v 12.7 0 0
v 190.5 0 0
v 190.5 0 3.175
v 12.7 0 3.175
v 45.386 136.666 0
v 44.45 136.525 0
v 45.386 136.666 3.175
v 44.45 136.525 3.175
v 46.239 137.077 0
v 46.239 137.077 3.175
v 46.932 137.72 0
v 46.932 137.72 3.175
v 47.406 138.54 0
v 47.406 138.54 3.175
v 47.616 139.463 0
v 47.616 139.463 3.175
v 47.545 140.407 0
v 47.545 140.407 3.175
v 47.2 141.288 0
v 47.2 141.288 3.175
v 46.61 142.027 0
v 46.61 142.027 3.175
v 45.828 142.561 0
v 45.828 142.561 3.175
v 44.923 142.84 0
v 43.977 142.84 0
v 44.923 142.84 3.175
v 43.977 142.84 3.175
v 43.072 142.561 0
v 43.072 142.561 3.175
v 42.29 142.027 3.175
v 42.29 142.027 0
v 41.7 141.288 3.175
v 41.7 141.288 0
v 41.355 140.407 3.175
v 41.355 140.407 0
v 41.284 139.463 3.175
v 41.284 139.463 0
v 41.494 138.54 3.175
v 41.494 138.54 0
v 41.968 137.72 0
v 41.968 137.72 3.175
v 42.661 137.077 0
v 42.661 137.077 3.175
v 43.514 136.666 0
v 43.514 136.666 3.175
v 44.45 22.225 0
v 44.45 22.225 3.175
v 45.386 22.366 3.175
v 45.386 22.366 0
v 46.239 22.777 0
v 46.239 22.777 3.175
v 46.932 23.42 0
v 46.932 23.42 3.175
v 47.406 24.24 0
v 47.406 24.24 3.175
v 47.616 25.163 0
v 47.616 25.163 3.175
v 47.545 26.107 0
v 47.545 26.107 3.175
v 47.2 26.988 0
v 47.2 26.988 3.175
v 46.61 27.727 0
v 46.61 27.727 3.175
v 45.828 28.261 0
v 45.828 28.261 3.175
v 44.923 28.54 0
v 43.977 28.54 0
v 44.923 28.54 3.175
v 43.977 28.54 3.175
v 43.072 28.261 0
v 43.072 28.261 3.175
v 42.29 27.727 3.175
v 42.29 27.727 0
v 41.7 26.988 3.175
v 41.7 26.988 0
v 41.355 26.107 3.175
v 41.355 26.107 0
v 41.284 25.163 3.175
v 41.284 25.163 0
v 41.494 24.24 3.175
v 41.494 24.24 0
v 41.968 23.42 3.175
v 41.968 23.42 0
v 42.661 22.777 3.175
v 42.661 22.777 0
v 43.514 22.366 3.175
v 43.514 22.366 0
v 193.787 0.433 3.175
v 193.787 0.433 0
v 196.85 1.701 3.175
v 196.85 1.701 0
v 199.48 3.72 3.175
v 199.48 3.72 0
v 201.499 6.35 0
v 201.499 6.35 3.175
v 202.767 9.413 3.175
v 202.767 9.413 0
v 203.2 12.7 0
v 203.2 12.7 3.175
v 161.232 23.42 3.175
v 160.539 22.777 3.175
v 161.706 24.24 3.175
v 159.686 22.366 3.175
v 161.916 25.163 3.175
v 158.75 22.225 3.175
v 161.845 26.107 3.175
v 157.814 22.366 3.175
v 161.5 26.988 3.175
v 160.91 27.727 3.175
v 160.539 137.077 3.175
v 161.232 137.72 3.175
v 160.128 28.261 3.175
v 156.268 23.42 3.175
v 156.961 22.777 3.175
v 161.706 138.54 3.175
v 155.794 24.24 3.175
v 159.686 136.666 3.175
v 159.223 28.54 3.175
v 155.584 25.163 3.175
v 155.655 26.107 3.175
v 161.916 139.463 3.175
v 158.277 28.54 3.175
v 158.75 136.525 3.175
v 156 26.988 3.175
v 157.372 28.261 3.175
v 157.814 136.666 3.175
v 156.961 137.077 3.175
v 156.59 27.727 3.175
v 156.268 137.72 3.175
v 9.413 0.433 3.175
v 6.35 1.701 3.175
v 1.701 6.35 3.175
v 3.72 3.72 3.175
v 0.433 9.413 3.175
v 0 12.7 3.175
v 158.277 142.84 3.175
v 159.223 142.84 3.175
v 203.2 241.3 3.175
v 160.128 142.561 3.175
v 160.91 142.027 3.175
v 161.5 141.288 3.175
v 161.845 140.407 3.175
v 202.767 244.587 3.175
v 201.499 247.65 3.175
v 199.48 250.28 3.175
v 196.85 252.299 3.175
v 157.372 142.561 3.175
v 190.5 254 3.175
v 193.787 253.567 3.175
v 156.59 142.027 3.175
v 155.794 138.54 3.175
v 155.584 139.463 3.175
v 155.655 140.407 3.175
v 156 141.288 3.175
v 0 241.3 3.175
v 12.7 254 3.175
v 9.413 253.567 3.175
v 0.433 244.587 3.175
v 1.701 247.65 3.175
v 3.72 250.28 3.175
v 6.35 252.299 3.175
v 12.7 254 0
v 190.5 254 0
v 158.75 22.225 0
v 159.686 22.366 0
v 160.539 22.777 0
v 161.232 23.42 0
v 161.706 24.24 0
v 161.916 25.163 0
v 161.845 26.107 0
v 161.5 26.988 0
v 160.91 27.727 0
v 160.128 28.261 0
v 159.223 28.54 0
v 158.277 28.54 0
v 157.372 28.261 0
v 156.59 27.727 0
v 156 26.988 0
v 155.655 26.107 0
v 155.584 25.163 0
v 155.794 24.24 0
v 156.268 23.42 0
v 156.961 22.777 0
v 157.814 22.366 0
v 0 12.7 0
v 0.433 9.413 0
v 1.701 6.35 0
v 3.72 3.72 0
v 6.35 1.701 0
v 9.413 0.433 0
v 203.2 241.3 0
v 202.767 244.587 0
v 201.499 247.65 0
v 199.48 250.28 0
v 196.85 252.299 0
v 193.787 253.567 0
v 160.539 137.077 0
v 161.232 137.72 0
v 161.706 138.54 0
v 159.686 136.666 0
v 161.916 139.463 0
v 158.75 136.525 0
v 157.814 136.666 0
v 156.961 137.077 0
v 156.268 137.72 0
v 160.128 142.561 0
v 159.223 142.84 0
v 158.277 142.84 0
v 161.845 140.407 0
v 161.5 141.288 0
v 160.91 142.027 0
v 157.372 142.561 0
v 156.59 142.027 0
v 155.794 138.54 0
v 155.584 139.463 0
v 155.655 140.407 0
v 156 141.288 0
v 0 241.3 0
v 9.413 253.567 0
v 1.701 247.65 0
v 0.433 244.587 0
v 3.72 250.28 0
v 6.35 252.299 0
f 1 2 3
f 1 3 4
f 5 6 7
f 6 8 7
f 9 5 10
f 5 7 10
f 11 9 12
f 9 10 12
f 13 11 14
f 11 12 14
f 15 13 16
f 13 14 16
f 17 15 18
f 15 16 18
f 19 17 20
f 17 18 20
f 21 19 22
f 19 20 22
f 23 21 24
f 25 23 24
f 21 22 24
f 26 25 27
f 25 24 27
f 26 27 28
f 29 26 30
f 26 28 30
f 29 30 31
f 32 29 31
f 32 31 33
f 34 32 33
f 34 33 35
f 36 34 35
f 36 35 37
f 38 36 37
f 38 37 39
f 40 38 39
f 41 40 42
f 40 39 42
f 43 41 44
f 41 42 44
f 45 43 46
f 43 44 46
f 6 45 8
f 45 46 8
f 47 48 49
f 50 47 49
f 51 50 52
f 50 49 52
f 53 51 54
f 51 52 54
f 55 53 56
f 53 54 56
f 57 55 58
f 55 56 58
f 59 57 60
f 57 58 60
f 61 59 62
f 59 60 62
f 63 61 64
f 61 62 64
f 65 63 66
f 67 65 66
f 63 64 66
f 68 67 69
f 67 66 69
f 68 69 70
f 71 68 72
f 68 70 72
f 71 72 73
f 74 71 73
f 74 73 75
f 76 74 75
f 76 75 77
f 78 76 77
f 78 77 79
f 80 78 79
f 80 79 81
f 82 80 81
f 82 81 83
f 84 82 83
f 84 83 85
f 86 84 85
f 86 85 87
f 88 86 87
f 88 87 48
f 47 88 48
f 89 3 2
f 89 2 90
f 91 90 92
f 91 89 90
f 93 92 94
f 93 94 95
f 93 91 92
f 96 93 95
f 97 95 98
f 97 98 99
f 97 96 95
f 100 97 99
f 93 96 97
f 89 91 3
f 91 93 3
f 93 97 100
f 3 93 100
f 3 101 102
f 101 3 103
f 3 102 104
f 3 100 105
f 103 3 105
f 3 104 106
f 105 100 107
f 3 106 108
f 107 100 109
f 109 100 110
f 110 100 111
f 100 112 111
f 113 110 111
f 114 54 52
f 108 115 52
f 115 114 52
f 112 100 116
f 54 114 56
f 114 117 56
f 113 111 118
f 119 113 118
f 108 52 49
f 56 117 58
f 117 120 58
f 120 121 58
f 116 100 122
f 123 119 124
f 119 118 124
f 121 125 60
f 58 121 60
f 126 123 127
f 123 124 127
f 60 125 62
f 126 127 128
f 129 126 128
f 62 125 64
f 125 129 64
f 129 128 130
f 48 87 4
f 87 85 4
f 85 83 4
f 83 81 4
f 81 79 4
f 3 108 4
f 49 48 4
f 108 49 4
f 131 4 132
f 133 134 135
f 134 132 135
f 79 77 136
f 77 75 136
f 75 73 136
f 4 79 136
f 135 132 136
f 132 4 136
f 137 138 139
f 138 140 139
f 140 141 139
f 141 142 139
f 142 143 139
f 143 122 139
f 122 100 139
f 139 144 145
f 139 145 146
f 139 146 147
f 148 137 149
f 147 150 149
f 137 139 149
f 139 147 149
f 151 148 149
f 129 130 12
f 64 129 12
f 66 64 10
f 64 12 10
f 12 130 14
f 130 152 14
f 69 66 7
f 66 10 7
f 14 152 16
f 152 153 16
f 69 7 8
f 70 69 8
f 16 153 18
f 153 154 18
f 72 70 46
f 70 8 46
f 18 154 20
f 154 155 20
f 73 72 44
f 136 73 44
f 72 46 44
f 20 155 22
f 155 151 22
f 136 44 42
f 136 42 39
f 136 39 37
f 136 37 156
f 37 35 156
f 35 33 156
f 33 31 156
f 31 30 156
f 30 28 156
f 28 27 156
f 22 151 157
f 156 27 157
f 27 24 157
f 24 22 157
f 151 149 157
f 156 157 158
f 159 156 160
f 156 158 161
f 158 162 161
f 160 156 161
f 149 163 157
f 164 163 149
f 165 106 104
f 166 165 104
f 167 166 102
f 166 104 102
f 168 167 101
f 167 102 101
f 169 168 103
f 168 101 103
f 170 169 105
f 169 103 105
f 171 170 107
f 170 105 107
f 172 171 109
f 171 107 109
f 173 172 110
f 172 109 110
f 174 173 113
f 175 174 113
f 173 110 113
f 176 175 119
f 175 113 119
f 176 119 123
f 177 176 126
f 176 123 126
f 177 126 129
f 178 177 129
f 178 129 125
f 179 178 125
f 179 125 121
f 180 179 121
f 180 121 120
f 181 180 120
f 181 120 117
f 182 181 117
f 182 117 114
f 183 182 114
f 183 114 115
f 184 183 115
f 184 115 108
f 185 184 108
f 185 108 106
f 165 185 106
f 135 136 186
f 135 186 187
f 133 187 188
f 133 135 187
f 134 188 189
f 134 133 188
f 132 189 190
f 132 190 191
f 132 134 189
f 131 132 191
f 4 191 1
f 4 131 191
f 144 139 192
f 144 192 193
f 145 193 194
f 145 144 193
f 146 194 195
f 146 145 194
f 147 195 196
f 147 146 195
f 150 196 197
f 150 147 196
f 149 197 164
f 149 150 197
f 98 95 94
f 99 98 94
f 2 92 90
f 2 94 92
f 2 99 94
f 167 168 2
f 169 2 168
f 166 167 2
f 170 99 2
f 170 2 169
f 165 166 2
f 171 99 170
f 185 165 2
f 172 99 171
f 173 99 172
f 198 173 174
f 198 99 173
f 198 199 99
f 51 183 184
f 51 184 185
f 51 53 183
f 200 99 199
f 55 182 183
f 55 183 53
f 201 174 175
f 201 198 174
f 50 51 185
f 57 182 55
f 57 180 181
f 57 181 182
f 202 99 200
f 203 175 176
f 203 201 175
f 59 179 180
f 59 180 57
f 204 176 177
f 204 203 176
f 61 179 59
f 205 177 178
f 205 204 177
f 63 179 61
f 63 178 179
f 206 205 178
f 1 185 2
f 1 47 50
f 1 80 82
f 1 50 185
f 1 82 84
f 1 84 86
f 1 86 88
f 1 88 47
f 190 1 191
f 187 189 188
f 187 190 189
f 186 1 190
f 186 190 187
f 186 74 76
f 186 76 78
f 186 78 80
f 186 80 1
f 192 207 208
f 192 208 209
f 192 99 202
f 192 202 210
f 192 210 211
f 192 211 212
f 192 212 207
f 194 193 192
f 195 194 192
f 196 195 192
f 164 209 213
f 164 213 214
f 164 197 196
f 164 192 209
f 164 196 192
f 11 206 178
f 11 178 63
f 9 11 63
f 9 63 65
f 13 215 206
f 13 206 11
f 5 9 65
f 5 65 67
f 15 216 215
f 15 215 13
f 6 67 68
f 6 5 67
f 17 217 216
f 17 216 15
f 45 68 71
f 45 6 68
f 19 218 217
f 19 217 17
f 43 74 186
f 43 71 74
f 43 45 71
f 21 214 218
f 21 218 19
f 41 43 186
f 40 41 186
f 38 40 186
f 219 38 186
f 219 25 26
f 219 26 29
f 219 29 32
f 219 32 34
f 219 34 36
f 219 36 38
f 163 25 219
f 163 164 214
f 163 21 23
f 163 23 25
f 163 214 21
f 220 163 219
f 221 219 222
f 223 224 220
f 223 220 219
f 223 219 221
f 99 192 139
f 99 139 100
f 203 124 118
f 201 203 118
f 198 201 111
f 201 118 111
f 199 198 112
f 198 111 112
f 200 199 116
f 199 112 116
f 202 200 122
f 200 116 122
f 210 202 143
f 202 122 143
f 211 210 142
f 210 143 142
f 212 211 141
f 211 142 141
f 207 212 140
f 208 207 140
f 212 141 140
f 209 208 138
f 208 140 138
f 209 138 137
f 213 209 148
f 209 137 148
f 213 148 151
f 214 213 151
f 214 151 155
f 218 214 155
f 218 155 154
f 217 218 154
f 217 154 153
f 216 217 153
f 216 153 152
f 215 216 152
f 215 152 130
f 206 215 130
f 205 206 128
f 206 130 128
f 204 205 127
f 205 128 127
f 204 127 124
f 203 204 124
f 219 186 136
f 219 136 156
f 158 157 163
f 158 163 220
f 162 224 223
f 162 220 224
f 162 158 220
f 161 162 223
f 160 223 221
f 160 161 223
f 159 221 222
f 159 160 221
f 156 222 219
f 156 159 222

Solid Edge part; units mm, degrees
sketch "Sketch1" plane through (0, 0, 0) normal (0, 0, 1) x (1, 0, 0)
  line L0 (0, 0) -> (0, 254)
  line L1 (0, 254) -> (203.2, 254)
  line L2 (203.2, 254) -> (203.2, 0)
  line L3 (203.2, 0) -> (0, 0)
  dimension "D1" = 203.2
  dimension "D2" = 254
extrude "Protrusion1" add sketch "Sketch1" along normal blind 3.175
hole "Hole_1" at (158.75, 139.7, 3.175) direction (0, 0, -1) diameter 6.35 end up to next
hole "Hole1" at (158.75, 25.4, 3.175) direction (0, 0, -1) diameter 6.35 end up to next
hole "Hole2" at (44.45, 25.4, 3.175) direction (0, 0, -1) diameter 6.35 end up to next
hole "Hole3" at (44.45, 139.7, 3.175) direction (0, 0, -1) diameter 6.35 end up to next
fillet "Round_1" radius 12.7 4 edges at (0, 0, 1.5875) (203.2, 0, 1.5875) (203.2, 254, 1.5875) (0, 254, 1.5875)
properties part number "CHAS-05" material "Acrylic, high impact grade"
